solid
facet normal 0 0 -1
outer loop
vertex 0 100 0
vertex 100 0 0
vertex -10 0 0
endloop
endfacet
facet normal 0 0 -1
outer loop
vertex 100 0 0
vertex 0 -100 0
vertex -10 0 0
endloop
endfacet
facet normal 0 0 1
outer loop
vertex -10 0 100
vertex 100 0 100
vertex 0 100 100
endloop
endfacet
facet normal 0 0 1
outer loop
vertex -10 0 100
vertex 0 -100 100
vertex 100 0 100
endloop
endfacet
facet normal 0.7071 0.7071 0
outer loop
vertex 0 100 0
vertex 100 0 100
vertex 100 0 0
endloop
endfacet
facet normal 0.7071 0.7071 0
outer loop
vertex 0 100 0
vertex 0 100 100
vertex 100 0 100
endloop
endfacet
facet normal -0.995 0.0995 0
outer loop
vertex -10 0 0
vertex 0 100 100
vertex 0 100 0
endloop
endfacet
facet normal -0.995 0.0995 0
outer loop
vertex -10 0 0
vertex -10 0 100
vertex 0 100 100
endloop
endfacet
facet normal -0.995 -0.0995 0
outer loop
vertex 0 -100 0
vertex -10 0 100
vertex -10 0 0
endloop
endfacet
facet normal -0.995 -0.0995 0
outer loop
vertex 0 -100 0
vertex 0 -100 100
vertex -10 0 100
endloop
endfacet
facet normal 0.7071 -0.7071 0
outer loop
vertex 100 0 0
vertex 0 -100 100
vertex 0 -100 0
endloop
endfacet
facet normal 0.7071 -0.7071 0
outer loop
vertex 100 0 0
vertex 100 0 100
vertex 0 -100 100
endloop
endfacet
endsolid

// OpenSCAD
linear_extrude(100.0000){polygon(points=[[100.0,0.0],[0.0,100.0],[-10.0,0.0],[0.0,-100.0]]);}
